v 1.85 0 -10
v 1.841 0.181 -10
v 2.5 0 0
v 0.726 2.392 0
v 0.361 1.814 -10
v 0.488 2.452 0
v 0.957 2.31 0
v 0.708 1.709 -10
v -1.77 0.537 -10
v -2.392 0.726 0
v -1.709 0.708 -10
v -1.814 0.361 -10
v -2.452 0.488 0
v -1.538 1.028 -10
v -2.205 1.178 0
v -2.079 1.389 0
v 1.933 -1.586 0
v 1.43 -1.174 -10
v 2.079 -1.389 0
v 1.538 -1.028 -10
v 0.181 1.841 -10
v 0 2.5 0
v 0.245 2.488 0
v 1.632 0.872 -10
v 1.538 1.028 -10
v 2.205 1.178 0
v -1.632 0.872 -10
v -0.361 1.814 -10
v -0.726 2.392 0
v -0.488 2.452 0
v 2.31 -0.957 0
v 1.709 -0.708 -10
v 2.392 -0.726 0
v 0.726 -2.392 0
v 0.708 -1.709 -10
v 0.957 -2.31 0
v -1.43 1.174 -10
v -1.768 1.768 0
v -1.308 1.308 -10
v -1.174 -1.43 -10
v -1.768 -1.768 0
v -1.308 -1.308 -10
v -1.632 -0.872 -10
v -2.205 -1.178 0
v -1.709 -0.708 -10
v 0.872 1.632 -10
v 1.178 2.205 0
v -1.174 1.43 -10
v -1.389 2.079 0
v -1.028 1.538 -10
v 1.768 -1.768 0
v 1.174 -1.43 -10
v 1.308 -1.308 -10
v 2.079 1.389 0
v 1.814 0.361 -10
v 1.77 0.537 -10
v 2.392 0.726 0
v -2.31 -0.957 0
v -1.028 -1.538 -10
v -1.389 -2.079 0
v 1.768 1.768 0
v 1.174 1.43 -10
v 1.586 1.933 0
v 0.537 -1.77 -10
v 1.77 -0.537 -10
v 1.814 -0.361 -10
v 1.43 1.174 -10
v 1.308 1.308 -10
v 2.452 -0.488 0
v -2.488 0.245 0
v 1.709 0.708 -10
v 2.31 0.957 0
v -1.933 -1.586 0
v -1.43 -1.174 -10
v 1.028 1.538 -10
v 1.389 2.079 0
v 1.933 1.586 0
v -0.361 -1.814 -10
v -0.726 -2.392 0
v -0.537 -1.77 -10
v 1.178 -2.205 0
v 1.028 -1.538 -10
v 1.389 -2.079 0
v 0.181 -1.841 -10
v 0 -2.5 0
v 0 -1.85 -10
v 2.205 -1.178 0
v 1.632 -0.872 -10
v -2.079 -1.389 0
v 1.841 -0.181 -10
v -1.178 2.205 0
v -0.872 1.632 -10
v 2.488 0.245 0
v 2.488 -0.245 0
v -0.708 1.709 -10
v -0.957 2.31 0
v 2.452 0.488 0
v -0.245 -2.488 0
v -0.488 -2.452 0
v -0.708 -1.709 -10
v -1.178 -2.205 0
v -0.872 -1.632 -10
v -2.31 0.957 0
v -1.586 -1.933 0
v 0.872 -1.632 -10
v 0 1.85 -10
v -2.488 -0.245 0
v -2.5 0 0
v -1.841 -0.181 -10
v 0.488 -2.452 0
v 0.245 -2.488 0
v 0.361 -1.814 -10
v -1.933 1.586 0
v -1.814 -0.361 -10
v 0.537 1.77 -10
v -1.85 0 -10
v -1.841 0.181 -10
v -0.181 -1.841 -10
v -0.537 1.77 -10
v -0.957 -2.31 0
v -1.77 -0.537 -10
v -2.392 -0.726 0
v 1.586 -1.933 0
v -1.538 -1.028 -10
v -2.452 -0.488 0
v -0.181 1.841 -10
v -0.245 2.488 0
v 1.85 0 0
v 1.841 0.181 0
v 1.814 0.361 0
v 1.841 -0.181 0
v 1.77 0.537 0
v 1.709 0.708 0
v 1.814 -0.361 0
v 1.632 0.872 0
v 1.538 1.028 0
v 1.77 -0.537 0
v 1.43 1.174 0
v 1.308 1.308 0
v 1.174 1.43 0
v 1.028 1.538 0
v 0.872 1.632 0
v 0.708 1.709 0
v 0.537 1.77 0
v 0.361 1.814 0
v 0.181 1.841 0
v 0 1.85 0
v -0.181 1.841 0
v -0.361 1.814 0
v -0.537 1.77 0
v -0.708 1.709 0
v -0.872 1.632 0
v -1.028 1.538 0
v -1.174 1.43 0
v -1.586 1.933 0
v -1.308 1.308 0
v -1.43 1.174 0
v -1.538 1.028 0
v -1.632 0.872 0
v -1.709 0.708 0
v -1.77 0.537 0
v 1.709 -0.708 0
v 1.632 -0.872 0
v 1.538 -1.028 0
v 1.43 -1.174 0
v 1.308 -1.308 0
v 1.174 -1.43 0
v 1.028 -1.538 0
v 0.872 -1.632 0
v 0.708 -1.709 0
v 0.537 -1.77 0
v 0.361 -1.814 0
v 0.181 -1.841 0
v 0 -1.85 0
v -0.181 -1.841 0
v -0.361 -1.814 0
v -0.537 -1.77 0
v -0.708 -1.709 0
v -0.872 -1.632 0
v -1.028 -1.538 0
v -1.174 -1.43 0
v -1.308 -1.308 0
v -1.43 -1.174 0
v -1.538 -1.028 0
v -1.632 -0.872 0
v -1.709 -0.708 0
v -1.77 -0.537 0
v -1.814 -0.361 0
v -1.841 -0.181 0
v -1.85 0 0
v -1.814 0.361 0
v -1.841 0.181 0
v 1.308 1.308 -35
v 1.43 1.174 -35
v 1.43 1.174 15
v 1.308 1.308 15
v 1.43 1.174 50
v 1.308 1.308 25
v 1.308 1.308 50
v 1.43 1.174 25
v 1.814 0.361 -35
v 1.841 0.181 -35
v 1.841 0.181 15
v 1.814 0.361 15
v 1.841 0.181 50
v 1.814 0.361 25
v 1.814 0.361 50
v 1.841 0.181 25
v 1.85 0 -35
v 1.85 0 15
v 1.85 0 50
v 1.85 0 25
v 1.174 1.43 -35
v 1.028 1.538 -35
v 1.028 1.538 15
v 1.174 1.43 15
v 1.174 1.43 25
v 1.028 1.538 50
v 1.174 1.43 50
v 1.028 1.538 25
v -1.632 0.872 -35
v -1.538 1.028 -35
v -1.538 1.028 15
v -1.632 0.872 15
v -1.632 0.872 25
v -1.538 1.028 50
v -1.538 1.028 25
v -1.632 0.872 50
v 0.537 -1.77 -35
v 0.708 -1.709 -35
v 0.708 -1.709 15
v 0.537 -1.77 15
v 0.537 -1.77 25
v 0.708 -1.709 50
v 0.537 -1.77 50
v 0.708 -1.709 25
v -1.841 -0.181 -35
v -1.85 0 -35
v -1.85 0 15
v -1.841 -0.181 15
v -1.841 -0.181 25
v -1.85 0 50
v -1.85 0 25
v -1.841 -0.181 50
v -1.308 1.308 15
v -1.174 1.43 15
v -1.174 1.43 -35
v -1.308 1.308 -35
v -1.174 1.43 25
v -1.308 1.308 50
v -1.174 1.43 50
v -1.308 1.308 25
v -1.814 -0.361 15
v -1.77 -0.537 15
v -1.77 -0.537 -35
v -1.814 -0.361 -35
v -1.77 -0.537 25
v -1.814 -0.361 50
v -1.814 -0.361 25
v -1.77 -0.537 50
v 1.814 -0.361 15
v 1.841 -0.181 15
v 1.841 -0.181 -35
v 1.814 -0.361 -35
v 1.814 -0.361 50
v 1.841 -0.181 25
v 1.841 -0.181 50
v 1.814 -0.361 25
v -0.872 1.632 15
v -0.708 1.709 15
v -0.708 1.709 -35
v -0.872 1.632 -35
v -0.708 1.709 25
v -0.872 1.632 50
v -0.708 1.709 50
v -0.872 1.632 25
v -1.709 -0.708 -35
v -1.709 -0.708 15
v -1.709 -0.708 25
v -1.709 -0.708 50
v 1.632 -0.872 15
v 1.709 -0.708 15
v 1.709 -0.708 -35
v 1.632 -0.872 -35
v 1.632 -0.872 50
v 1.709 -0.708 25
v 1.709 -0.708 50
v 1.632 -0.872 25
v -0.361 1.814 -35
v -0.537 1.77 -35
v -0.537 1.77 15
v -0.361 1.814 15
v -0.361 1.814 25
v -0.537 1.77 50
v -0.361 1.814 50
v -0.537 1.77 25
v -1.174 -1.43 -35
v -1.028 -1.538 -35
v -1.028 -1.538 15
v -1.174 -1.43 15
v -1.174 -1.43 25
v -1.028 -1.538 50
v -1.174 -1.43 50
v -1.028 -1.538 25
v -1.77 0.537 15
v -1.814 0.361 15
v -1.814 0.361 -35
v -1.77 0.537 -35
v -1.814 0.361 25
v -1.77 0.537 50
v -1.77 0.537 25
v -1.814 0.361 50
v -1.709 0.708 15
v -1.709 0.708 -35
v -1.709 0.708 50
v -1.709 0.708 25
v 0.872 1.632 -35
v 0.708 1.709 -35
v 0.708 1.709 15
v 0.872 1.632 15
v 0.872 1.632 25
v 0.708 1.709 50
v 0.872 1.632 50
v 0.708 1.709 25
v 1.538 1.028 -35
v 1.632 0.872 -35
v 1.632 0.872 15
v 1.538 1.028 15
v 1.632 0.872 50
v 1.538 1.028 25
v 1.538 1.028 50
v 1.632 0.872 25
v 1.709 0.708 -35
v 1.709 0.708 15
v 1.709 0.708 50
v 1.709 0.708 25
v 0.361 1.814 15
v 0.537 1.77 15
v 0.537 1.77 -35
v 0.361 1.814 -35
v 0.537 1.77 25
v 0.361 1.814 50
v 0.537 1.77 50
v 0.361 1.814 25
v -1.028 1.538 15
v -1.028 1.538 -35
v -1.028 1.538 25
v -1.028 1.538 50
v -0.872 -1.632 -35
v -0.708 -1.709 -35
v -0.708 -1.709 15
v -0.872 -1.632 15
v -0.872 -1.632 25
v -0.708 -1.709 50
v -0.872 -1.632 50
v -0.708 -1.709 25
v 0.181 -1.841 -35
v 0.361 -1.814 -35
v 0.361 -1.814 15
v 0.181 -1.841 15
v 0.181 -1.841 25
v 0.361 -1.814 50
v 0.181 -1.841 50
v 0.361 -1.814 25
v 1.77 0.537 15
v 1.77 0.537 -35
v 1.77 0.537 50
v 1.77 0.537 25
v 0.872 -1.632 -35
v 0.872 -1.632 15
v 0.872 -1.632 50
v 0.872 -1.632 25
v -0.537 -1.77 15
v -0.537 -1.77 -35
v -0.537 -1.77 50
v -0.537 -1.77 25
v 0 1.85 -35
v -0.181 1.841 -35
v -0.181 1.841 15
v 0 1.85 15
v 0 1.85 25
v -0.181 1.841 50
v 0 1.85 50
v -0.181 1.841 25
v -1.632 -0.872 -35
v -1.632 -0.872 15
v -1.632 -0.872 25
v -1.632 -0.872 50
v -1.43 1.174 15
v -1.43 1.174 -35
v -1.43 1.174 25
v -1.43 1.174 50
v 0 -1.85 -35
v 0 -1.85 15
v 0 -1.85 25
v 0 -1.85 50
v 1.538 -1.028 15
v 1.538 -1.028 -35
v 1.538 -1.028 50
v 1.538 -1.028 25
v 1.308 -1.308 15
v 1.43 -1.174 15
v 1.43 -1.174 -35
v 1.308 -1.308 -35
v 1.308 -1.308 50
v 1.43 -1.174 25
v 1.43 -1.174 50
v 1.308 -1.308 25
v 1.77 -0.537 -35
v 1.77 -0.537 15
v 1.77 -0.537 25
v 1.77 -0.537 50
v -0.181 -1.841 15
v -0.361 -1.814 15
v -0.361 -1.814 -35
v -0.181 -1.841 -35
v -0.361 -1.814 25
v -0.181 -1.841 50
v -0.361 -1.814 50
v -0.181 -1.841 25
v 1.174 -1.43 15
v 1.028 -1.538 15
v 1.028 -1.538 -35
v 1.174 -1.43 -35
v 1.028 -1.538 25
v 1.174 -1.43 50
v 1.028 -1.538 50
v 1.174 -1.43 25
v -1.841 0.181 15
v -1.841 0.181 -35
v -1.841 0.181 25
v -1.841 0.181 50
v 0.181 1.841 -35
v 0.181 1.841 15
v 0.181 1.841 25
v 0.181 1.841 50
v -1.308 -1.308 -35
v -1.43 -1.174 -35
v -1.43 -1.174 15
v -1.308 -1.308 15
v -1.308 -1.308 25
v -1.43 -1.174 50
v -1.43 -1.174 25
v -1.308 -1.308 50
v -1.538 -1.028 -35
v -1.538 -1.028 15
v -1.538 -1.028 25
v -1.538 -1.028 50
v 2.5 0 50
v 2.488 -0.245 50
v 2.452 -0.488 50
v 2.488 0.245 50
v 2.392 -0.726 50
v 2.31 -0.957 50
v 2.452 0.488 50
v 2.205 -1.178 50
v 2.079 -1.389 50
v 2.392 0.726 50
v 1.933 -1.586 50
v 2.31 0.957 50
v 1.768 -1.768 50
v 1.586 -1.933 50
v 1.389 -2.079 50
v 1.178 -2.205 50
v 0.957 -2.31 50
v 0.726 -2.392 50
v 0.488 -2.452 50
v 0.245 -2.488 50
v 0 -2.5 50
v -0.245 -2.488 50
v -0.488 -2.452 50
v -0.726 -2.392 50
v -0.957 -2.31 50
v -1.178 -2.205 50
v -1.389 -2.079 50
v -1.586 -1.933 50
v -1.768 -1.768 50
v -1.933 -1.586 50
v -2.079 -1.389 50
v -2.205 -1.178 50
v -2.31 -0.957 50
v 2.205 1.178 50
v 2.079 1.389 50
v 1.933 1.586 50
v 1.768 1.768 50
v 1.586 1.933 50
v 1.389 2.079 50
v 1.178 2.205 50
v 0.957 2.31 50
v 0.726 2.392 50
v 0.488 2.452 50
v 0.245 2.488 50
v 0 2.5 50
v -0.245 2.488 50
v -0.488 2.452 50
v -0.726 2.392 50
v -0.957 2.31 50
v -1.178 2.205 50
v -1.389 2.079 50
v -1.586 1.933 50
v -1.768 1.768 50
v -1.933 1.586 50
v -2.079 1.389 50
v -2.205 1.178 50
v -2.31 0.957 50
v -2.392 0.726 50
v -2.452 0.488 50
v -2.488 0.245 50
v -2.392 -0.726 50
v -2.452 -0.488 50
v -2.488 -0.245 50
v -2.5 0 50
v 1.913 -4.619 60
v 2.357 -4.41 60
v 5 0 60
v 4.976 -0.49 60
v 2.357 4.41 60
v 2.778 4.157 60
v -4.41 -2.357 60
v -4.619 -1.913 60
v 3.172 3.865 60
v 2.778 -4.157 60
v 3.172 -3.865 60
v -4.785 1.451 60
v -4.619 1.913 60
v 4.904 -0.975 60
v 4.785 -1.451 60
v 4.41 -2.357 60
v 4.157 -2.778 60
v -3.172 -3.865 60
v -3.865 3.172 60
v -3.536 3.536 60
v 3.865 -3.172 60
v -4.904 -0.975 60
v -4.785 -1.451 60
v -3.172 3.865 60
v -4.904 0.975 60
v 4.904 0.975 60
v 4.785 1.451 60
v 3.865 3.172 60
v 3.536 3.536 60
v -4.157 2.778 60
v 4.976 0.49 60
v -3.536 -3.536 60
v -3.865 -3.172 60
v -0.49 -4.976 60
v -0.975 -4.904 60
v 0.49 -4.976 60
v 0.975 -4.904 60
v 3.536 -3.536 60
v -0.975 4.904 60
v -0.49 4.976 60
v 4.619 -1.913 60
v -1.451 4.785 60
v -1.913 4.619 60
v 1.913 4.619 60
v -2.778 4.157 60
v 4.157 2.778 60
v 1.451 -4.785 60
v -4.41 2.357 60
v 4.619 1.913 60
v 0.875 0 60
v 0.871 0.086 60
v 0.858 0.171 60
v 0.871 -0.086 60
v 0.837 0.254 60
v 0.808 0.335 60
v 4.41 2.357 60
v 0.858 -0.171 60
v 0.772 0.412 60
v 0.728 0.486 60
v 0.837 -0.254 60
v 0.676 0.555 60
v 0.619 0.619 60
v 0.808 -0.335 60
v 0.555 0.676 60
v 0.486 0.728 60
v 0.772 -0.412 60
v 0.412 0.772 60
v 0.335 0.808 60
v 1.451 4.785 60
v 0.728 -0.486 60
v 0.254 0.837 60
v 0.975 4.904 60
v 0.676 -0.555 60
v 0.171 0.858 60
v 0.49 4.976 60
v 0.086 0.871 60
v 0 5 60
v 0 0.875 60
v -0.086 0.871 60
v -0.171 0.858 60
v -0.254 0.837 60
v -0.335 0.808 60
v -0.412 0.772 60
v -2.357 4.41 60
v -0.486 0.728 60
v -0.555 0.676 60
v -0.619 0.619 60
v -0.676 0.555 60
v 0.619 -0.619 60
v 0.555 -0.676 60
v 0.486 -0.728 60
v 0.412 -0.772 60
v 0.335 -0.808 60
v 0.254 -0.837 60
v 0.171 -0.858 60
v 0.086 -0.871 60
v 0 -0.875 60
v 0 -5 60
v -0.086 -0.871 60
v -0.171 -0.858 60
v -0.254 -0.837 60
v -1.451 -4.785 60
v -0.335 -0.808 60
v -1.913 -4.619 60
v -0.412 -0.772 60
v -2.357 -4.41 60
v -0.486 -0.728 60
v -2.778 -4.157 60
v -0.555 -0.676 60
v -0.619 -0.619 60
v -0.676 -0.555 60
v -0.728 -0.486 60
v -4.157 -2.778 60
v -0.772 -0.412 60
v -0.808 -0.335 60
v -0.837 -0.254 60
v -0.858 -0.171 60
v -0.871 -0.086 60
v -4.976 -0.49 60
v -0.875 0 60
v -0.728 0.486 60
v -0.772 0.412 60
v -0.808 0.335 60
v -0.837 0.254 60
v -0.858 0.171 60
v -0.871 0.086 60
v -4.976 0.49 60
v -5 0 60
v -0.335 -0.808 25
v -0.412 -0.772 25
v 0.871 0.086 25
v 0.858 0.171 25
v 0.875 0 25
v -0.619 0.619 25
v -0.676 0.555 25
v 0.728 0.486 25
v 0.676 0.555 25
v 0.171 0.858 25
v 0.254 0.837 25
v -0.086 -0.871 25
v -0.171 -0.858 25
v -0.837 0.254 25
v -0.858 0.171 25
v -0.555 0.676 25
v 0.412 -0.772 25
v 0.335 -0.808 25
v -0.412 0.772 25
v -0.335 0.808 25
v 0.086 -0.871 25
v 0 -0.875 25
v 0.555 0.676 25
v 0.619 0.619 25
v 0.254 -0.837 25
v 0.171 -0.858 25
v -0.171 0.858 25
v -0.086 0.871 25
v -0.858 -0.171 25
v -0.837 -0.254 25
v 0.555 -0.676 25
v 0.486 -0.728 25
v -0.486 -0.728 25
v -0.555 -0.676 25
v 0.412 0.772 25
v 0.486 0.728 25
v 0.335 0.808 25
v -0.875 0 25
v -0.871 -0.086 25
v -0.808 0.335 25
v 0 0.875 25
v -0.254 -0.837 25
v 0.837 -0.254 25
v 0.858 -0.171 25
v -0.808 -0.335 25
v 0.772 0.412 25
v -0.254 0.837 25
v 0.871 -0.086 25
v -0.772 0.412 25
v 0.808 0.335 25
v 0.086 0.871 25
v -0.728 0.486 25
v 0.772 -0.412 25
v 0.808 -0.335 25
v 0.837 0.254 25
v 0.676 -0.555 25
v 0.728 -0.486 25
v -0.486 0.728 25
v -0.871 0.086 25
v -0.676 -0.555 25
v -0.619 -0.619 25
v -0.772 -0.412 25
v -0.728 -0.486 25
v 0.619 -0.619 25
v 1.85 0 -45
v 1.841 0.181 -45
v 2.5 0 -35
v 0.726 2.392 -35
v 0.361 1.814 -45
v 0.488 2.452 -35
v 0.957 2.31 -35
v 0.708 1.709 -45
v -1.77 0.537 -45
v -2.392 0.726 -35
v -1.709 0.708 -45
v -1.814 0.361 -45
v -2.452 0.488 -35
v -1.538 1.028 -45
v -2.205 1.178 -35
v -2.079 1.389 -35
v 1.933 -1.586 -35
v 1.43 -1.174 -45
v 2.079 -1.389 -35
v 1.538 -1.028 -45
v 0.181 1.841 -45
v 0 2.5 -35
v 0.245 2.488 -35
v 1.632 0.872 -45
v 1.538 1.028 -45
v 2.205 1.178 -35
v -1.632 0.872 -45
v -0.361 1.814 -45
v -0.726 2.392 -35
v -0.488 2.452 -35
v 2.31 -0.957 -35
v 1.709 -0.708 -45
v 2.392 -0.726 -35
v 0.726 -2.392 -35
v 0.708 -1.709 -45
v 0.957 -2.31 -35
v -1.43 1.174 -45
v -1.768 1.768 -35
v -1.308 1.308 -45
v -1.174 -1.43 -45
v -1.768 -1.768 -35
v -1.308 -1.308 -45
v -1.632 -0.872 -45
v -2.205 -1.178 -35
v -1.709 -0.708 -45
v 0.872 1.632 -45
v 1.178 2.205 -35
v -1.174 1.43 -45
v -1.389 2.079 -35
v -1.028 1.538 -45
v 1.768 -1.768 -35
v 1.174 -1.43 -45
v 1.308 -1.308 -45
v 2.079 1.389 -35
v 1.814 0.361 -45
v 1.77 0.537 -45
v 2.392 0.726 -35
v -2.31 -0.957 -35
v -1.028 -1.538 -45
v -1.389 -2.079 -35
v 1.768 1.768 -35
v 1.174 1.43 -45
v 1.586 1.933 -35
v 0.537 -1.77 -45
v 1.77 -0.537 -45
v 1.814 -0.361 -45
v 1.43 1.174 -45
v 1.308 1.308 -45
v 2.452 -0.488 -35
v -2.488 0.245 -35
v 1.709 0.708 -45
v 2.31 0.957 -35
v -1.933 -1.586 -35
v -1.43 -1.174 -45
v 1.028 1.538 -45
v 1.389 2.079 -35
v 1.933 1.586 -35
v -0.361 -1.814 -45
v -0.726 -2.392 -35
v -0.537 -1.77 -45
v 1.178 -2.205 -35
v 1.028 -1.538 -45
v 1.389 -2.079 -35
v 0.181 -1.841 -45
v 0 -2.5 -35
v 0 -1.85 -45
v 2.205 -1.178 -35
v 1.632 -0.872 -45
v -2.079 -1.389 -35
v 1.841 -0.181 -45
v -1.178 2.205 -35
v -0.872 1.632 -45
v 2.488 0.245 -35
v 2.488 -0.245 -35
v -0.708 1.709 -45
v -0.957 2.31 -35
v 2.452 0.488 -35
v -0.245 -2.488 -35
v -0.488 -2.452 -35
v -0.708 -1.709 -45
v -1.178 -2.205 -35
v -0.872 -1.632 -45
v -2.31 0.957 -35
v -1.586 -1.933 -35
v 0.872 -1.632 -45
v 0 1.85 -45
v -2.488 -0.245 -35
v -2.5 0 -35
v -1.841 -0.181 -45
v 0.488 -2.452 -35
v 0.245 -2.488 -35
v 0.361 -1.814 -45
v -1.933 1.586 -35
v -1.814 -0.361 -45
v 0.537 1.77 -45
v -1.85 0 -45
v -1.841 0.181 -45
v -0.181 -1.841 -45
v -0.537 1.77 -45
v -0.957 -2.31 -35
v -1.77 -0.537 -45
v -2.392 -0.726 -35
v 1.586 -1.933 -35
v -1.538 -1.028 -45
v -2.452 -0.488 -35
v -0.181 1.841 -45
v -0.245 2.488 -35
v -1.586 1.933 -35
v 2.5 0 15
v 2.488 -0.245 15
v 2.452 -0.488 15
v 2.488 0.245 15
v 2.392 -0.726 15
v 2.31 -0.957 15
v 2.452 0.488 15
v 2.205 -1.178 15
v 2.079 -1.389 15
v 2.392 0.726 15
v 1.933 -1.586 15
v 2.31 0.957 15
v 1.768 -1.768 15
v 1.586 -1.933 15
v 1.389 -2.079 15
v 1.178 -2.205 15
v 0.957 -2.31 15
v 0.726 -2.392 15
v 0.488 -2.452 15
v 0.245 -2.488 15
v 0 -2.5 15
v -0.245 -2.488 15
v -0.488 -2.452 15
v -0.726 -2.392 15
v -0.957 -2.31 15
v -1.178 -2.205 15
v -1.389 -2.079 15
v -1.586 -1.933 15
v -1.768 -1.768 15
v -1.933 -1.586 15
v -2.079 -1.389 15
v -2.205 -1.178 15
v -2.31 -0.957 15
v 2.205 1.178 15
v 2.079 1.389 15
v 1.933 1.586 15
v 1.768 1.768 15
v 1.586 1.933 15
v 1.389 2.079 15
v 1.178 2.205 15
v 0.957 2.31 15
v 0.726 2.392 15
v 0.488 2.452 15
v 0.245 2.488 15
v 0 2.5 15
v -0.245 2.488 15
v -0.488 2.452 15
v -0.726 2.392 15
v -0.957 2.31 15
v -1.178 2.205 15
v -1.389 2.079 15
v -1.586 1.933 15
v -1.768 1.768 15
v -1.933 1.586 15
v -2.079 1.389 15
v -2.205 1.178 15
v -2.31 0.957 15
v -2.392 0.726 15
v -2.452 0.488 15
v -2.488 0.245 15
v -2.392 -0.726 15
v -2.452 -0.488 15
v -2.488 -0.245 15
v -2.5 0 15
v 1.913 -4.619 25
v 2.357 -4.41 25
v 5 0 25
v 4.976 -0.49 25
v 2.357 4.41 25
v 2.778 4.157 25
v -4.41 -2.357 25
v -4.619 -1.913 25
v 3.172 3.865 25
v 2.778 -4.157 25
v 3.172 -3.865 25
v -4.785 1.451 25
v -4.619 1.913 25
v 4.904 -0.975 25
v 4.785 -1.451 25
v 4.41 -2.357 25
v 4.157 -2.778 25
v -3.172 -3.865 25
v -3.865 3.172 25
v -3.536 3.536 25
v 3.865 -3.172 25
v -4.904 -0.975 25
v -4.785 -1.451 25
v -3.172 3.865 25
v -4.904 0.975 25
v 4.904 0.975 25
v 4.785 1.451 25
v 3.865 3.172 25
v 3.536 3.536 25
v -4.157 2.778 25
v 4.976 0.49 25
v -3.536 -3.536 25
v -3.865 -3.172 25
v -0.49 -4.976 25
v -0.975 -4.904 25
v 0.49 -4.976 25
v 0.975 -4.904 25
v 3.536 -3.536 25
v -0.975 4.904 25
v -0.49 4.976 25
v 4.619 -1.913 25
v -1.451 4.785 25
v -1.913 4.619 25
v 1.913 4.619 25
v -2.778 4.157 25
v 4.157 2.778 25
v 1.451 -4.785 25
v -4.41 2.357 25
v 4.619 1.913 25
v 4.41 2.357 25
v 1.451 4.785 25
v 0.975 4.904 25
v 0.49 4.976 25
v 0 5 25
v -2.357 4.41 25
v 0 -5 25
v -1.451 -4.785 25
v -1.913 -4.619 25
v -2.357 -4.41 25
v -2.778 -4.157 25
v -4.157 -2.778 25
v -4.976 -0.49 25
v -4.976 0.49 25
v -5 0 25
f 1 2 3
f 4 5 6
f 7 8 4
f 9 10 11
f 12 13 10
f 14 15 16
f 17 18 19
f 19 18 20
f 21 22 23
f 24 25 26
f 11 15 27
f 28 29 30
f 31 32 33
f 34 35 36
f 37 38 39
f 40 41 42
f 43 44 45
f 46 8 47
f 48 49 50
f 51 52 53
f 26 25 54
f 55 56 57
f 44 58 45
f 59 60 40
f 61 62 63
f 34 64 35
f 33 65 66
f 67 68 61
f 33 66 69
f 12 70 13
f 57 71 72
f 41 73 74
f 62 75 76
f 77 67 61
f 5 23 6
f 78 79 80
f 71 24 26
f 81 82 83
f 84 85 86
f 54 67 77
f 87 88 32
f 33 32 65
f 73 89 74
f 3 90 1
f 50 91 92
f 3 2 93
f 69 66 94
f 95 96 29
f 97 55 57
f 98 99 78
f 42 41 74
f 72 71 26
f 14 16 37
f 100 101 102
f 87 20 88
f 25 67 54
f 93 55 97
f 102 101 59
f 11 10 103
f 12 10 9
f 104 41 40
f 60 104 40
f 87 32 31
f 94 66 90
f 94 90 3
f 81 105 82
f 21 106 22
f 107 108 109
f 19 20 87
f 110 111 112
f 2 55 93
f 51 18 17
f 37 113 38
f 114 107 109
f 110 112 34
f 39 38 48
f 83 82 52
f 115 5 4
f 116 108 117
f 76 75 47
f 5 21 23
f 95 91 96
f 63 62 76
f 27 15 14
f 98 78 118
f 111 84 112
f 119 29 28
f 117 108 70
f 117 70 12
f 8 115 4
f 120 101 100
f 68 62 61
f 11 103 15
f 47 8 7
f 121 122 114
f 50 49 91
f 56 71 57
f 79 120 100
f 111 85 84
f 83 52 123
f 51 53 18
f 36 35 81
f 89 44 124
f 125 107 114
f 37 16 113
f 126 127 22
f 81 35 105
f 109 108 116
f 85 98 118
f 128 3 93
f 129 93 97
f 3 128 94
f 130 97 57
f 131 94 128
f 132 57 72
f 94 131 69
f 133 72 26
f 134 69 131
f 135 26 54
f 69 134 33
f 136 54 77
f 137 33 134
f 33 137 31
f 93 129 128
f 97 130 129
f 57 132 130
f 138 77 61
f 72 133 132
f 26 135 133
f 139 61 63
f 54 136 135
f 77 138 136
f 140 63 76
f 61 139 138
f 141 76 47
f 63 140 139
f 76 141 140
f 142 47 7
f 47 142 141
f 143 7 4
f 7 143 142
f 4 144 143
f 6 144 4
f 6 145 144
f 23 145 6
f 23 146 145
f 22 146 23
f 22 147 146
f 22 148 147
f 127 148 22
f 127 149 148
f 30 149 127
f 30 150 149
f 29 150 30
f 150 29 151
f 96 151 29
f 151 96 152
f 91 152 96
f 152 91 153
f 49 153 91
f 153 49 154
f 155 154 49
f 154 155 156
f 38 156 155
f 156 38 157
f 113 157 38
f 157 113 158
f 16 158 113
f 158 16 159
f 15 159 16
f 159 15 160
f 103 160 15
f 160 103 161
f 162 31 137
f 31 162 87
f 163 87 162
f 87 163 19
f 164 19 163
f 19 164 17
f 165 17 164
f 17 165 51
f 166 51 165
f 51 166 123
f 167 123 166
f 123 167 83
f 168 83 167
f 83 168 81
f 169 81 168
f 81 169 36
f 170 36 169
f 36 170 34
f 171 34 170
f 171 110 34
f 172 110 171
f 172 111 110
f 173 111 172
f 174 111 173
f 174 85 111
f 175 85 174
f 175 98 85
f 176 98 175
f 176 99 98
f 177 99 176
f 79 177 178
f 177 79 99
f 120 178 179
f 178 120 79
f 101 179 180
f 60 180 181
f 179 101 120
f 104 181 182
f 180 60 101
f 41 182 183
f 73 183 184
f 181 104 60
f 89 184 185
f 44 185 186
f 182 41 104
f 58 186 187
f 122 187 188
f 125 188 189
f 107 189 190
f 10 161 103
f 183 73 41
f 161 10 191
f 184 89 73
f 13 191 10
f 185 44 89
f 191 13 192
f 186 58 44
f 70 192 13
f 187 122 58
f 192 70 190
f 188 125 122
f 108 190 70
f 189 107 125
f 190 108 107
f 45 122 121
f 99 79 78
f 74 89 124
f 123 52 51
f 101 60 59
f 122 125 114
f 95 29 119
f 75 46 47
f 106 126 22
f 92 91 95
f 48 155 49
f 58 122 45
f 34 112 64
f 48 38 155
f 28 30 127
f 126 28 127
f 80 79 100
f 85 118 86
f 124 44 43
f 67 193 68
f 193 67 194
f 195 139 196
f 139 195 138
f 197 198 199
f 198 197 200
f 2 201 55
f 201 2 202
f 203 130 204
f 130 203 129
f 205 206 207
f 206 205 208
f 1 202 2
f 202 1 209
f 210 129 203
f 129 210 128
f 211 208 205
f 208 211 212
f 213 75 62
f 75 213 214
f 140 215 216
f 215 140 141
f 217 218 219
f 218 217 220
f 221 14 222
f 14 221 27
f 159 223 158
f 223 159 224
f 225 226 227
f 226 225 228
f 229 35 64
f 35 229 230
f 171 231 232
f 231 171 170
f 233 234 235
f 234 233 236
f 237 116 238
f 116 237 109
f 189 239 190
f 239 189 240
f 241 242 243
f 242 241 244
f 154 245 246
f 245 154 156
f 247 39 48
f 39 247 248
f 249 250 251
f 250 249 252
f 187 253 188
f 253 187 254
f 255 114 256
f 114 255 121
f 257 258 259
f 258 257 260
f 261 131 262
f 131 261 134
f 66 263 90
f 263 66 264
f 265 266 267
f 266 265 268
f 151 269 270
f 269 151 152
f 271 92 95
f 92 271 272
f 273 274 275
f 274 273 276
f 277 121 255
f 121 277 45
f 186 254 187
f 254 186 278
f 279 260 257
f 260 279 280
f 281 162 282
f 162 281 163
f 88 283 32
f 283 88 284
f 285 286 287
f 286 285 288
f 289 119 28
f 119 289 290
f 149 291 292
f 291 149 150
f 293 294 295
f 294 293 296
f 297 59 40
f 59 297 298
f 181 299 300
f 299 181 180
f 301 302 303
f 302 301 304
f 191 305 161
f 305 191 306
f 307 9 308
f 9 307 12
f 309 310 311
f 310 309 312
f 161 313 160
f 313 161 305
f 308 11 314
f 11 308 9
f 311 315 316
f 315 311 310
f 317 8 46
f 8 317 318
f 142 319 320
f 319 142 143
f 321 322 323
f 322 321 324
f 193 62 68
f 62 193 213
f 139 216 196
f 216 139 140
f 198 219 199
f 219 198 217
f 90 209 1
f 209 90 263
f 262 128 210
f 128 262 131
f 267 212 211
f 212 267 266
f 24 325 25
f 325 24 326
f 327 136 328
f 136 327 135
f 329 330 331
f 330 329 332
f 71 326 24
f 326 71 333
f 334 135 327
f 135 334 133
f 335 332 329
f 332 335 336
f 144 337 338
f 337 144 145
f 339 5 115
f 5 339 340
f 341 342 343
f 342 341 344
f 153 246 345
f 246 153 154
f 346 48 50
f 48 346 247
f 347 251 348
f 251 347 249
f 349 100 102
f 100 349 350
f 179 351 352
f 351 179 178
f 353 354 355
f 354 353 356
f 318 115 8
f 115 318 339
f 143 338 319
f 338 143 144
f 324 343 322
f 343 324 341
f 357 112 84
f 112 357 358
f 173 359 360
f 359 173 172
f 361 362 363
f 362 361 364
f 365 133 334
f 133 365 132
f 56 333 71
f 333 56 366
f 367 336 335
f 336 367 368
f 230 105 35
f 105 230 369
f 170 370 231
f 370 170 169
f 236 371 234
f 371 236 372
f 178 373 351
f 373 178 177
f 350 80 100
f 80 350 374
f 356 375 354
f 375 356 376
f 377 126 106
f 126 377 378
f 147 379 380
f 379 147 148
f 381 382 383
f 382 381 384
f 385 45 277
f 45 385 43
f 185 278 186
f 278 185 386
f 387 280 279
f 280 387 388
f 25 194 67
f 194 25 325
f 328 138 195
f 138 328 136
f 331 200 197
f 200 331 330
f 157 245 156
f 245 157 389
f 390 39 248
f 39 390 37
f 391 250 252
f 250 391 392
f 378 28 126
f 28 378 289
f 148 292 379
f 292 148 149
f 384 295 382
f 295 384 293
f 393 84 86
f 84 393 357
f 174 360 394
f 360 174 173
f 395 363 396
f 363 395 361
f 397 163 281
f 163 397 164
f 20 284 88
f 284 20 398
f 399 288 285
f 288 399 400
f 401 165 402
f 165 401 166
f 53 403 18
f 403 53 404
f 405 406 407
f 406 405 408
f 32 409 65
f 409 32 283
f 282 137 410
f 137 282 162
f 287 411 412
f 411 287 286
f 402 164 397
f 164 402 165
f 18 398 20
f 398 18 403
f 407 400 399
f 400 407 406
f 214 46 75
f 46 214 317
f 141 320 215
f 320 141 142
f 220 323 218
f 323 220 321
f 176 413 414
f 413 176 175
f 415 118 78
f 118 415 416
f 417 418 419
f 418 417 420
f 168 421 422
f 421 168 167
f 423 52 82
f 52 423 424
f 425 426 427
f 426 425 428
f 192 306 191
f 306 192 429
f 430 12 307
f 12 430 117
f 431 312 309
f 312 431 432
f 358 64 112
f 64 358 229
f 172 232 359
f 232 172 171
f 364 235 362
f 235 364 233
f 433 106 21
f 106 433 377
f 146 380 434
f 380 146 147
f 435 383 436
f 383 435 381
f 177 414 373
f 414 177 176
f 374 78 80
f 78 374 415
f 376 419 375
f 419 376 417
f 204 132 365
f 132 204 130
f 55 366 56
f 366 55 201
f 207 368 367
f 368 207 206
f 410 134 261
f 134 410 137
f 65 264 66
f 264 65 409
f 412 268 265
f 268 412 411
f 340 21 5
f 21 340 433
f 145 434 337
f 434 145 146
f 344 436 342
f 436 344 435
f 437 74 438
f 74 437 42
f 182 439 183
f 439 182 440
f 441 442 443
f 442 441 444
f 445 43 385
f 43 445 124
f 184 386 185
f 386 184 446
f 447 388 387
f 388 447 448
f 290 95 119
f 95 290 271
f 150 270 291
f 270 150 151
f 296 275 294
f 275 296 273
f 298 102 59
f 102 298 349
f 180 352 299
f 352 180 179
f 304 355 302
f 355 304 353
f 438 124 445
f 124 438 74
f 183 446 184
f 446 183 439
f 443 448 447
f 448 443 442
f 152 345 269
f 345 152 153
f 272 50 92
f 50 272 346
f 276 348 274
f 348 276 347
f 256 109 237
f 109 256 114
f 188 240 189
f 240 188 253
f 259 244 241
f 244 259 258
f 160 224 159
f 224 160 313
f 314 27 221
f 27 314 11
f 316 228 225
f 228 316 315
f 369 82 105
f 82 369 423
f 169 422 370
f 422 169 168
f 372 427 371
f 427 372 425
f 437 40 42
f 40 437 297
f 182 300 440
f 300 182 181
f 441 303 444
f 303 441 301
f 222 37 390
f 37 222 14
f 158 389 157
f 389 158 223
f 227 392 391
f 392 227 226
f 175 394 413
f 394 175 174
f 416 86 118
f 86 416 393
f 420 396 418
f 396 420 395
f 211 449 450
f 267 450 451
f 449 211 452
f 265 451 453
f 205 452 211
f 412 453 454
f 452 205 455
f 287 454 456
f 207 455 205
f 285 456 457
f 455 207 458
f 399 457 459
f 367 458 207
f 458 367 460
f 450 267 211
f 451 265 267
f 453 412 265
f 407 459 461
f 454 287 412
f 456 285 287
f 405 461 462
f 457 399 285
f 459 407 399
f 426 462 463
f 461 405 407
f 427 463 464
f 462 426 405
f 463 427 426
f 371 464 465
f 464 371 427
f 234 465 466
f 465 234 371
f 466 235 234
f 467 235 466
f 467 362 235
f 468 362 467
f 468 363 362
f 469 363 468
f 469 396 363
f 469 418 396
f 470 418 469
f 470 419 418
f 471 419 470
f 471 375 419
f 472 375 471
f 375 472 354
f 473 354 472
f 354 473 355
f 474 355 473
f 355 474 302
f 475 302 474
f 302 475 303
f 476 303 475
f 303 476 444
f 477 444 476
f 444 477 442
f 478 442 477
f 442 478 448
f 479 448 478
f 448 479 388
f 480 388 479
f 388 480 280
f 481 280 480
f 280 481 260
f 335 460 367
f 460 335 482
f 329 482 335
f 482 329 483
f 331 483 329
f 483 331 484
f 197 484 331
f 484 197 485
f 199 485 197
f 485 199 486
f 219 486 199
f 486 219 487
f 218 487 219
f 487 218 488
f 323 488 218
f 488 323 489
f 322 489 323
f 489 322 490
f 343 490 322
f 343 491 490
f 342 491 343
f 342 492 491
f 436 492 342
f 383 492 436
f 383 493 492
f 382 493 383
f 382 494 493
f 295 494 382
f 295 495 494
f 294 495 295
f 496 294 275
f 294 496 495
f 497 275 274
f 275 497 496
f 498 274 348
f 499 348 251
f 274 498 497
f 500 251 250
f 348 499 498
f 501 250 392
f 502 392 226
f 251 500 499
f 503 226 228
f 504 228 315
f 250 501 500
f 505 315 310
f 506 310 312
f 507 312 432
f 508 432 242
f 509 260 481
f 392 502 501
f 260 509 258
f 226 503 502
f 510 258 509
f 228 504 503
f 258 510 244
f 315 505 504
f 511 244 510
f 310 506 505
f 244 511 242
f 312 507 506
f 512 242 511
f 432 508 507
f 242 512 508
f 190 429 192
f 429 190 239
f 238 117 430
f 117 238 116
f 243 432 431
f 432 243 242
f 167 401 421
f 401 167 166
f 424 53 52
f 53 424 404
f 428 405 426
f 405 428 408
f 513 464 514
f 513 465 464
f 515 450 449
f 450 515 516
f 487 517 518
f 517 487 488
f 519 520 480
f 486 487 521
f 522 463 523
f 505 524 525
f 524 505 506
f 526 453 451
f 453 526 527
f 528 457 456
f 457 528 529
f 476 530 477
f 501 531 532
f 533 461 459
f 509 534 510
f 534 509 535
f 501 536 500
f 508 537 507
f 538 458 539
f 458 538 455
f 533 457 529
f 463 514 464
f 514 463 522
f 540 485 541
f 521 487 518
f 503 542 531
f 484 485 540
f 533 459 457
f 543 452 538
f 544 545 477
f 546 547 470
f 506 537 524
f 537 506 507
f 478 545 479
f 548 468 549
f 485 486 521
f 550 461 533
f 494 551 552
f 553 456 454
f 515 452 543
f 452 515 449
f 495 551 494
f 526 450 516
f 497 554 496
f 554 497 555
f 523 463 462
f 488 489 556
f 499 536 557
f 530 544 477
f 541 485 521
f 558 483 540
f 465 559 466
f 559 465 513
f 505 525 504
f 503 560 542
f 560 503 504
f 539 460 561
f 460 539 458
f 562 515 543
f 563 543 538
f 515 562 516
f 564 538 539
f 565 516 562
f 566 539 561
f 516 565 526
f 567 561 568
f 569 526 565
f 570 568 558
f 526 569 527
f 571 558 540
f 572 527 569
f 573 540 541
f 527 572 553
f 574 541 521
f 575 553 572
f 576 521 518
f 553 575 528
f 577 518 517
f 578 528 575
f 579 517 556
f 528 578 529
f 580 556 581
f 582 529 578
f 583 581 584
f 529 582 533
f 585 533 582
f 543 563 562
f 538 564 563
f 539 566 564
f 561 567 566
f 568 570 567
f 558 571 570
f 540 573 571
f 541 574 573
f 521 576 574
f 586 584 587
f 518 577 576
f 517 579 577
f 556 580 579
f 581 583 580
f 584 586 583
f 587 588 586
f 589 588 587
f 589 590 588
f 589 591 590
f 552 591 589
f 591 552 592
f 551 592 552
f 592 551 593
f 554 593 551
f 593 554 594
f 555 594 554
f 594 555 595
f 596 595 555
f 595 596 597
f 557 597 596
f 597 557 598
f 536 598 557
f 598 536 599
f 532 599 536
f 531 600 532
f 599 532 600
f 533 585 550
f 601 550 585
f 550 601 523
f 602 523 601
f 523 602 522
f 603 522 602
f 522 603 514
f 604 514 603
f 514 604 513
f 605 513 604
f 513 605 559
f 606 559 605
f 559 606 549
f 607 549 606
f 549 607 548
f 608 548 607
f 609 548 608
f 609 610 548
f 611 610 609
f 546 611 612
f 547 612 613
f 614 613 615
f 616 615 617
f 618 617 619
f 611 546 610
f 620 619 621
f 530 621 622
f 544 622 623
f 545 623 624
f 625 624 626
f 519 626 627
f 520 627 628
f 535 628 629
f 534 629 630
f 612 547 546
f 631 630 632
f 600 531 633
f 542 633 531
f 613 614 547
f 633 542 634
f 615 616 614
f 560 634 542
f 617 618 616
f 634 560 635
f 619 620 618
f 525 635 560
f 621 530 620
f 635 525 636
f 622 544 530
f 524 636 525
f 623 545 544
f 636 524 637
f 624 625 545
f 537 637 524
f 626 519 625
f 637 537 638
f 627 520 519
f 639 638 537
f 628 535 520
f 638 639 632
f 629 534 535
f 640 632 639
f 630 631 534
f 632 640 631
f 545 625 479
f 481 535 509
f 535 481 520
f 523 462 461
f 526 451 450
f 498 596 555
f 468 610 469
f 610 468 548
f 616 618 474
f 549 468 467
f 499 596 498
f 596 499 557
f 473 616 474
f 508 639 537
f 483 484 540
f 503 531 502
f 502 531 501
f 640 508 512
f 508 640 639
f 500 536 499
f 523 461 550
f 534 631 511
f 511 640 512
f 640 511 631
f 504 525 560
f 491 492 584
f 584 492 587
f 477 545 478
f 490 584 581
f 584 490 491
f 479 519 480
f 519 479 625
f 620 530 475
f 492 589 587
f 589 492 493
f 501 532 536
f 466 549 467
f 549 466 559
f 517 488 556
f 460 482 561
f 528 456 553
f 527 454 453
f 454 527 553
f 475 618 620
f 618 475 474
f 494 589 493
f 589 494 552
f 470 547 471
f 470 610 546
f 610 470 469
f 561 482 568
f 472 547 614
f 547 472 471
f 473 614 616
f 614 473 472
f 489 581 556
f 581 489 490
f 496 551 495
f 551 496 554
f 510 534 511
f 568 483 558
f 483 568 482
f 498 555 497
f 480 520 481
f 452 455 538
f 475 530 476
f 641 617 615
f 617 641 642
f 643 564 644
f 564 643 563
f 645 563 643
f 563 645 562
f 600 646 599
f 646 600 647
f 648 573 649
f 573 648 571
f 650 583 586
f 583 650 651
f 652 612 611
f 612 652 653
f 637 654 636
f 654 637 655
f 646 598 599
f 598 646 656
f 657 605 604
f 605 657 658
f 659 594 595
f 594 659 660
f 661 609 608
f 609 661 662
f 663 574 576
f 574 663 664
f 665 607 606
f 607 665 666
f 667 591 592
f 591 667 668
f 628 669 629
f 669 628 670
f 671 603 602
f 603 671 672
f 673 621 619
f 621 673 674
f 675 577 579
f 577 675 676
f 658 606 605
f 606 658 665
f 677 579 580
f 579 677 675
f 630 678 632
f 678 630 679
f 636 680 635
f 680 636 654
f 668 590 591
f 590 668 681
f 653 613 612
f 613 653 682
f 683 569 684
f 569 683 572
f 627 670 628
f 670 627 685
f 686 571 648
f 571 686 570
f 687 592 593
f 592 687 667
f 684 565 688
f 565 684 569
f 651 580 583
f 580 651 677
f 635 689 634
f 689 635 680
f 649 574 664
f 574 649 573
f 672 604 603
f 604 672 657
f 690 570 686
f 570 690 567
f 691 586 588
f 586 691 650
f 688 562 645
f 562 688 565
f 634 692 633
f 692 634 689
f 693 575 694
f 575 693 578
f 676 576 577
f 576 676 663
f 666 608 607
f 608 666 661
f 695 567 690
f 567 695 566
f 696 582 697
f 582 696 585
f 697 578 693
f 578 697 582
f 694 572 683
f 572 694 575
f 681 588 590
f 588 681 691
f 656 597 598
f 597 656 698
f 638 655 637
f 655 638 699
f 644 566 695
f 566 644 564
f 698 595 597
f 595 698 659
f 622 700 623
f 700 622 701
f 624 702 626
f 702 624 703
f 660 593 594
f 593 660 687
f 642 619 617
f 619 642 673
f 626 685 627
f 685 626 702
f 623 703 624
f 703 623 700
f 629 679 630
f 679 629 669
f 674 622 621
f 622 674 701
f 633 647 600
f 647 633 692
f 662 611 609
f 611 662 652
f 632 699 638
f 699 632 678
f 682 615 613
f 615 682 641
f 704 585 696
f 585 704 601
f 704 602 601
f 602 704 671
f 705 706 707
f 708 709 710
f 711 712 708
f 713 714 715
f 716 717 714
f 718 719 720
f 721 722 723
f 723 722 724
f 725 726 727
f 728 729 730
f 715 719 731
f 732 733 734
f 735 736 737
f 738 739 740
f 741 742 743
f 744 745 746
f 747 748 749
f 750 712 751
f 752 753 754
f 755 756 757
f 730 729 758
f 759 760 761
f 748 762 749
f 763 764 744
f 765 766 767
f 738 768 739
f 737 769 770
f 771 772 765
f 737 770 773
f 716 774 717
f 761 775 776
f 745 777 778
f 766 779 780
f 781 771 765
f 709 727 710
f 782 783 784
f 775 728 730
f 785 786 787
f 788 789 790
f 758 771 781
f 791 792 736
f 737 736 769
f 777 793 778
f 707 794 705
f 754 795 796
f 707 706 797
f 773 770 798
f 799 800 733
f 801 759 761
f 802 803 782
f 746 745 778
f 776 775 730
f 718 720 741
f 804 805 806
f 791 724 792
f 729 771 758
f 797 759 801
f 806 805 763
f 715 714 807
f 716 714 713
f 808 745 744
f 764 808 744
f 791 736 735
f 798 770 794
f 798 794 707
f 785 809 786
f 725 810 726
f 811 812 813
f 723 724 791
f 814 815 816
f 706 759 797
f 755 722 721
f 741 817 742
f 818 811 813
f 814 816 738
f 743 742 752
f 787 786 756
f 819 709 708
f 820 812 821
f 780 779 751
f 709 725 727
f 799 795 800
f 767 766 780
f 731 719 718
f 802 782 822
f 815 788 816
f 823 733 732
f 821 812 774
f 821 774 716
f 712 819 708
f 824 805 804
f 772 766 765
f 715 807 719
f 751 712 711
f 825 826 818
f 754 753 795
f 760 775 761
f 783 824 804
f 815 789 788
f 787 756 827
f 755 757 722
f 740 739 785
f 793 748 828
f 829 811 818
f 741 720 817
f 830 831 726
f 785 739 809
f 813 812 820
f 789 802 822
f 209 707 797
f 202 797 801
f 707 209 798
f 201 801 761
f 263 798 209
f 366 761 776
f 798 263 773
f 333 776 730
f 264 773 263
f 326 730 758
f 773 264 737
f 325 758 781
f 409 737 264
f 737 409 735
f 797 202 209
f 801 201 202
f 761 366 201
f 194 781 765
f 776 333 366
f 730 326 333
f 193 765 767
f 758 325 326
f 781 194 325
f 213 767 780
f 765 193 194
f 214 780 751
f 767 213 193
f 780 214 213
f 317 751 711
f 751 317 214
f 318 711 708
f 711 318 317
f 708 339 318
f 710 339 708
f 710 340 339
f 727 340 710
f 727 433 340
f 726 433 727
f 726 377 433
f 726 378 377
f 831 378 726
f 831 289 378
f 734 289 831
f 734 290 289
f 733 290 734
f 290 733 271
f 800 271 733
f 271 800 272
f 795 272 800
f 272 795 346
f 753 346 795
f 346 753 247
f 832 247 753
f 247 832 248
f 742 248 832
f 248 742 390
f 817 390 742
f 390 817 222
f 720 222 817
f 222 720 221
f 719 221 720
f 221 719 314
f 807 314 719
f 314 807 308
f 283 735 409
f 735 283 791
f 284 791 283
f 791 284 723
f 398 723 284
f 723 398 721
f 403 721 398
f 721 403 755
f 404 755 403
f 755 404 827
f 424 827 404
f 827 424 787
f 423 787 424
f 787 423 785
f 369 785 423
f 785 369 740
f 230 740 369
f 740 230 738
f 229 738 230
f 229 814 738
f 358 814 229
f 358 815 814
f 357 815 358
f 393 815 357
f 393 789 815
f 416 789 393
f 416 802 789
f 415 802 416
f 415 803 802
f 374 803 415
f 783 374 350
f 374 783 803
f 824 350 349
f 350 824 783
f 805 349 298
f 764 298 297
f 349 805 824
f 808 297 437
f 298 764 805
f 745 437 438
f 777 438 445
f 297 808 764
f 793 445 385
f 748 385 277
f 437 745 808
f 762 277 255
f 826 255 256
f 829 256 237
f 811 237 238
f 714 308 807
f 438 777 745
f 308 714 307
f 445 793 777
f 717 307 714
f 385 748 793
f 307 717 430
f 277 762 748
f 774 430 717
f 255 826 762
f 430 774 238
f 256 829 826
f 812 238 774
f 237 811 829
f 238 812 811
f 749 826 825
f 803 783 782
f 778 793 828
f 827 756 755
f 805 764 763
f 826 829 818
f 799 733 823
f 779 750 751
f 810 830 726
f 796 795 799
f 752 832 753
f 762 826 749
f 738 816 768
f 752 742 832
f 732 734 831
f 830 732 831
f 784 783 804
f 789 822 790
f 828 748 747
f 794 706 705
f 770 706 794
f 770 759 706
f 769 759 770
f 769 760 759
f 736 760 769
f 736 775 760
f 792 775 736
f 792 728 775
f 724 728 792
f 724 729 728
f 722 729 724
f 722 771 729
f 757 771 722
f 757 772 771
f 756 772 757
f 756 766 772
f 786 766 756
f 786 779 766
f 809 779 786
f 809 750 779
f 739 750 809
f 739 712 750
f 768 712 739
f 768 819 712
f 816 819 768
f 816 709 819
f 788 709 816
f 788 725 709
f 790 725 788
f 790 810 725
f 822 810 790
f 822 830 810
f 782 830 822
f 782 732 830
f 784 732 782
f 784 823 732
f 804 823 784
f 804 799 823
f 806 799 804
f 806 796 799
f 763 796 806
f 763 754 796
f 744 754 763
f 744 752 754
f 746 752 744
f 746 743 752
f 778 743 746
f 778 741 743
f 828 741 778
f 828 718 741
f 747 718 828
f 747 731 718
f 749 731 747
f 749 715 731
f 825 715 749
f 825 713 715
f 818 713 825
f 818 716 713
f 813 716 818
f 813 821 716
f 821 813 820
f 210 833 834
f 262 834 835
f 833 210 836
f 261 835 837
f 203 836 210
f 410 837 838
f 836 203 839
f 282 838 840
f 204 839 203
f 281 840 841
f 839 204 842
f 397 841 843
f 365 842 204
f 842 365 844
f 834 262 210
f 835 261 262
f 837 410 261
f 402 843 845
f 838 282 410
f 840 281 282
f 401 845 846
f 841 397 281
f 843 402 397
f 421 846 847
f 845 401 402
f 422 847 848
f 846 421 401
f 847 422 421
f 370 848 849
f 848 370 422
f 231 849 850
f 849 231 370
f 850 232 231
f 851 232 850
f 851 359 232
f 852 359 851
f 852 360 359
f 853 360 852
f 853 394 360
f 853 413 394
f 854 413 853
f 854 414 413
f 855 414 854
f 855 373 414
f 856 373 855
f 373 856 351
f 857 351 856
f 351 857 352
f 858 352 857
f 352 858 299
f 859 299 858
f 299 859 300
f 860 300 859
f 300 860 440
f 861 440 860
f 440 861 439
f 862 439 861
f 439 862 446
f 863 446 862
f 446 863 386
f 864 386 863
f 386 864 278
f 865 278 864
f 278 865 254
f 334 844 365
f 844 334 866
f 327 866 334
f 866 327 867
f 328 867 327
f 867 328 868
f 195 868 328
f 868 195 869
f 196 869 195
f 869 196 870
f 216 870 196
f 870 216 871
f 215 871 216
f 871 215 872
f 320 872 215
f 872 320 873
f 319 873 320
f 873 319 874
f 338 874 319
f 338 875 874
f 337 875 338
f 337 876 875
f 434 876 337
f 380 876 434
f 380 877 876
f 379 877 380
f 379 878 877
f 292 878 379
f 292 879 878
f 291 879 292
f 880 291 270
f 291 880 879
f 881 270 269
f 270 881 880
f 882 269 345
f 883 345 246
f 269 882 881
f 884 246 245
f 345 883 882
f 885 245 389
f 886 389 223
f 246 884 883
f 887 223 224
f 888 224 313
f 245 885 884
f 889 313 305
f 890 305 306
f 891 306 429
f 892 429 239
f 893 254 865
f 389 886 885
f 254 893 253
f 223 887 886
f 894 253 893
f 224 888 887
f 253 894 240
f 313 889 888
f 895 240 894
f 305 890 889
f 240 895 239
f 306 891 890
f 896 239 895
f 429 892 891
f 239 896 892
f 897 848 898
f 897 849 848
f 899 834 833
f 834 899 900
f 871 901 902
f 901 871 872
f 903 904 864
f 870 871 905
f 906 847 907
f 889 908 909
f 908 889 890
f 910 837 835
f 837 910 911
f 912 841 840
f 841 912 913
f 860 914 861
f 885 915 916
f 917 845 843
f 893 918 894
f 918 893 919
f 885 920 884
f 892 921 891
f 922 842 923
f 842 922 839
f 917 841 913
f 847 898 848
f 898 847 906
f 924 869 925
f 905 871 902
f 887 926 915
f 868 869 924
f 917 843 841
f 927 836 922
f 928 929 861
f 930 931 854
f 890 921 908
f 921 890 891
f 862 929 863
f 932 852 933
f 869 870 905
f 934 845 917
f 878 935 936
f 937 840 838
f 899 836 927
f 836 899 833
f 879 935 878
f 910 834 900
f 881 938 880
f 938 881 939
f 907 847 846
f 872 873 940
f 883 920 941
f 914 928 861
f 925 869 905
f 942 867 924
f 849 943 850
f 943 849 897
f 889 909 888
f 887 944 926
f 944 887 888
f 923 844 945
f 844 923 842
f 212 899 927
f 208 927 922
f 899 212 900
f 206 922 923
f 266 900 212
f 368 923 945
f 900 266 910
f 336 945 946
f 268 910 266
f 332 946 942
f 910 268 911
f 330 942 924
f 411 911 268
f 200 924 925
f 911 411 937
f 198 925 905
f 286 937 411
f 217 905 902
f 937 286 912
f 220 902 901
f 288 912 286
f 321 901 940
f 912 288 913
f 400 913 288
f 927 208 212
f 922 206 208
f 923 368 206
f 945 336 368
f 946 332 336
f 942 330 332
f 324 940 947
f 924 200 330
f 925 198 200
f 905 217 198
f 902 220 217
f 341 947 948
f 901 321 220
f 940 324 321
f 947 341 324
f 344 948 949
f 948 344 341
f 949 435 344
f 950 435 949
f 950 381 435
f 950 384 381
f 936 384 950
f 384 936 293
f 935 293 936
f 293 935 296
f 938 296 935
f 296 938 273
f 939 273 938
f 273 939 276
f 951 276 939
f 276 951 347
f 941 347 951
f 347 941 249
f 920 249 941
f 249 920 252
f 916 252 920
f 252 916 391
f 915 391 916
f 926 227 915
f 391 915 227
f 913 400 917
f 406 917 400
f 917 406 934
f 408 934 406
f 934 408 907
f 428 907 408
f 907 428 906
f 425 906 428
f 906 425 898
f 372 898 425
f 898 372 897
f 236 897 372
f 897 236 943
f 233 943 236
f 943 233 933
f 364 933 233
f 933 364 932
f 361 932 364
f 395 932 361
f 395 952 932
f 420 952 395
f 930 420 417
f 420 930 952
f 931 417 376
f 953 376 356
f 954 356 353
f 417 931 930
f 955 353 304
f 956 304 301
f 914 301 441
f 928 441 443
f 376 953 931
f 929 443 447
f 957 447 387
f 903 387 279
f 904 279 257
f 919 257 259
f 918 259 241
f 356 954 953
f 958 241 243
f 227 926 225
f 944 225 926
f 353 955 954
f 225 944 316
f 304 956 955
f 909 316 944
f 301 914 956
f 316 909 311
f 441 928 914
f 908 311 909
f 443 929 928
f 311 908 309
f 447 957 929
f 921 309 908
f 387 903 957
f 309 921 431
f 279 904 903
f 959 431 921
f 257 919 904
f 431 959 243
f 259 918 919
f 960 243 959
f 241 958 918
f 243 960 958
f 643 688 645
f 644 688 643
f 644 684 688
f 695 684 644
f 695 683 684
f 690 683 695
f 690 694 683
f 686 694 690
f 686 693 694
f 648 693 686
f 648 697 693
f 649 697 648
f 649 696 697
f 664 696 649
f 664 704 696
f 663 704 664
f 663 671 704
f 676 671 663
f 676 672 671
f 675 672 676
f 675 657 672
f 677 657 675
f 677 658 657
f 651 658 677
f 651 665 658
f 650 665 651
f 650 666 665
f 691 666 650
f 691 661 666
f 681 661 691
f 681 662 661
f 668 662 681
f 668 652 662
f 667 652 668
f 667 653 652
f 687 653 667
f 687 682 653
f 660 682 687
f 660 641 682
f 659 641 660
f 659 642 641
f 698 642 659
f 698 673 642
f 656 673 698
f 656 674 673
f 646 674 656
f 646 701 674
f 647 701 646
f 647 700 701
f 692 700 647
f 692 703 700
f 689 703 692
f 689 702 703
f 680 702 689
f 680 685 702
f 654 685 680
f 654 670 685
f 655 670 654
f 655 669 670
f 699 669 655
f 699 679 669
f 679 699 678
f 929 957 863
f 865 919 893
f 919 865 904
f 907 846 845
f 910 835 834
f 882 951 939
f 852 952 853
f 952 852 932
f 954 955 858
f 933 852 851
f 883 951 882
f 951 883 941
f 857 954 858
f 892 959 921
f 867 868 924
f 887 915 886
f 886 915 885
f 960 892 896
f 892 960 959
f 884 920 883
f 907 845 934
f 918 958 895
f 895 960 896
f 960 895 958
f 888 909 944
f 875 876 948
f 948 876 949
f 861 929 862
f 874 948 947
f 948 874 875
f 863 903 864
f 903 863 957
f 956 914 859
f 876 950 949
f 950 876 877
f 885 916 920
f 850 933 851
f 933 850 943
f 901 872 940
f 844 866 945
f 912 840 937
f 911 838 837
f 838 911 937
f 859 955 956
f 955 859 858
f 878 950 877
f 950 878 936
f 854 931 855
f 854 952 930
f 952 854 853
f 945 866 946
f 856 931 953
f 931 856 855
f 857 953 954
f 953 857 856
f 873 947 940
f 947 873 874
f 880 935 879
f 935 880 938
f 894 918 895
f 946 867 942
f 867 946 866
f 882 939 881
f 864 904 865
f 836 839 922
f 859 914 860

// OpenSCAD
module hot_end() {
    union() {
        // Nozzle
        translate([0, 0, -10])
            cylinder(h=10, d1=3.7, d2=5, $fn=64);
        
        // Barrel
        translate([0, 0, 0])
            cylinder(h=50, d=3.7, $fn=64);
        
        // Heat sink
        translate([0, 0, 50])
            cylinder(h=10, d1=5, d2=10, $fn=64);
    }
}

module filament_path() {
    translate([0, 0, -10])
        cylinder(h=70, d=1.75, $fn=64);
}

difference() {
    hot_end();
    filament_path();
}

translate([0, 0, -35])
    hot_end();
